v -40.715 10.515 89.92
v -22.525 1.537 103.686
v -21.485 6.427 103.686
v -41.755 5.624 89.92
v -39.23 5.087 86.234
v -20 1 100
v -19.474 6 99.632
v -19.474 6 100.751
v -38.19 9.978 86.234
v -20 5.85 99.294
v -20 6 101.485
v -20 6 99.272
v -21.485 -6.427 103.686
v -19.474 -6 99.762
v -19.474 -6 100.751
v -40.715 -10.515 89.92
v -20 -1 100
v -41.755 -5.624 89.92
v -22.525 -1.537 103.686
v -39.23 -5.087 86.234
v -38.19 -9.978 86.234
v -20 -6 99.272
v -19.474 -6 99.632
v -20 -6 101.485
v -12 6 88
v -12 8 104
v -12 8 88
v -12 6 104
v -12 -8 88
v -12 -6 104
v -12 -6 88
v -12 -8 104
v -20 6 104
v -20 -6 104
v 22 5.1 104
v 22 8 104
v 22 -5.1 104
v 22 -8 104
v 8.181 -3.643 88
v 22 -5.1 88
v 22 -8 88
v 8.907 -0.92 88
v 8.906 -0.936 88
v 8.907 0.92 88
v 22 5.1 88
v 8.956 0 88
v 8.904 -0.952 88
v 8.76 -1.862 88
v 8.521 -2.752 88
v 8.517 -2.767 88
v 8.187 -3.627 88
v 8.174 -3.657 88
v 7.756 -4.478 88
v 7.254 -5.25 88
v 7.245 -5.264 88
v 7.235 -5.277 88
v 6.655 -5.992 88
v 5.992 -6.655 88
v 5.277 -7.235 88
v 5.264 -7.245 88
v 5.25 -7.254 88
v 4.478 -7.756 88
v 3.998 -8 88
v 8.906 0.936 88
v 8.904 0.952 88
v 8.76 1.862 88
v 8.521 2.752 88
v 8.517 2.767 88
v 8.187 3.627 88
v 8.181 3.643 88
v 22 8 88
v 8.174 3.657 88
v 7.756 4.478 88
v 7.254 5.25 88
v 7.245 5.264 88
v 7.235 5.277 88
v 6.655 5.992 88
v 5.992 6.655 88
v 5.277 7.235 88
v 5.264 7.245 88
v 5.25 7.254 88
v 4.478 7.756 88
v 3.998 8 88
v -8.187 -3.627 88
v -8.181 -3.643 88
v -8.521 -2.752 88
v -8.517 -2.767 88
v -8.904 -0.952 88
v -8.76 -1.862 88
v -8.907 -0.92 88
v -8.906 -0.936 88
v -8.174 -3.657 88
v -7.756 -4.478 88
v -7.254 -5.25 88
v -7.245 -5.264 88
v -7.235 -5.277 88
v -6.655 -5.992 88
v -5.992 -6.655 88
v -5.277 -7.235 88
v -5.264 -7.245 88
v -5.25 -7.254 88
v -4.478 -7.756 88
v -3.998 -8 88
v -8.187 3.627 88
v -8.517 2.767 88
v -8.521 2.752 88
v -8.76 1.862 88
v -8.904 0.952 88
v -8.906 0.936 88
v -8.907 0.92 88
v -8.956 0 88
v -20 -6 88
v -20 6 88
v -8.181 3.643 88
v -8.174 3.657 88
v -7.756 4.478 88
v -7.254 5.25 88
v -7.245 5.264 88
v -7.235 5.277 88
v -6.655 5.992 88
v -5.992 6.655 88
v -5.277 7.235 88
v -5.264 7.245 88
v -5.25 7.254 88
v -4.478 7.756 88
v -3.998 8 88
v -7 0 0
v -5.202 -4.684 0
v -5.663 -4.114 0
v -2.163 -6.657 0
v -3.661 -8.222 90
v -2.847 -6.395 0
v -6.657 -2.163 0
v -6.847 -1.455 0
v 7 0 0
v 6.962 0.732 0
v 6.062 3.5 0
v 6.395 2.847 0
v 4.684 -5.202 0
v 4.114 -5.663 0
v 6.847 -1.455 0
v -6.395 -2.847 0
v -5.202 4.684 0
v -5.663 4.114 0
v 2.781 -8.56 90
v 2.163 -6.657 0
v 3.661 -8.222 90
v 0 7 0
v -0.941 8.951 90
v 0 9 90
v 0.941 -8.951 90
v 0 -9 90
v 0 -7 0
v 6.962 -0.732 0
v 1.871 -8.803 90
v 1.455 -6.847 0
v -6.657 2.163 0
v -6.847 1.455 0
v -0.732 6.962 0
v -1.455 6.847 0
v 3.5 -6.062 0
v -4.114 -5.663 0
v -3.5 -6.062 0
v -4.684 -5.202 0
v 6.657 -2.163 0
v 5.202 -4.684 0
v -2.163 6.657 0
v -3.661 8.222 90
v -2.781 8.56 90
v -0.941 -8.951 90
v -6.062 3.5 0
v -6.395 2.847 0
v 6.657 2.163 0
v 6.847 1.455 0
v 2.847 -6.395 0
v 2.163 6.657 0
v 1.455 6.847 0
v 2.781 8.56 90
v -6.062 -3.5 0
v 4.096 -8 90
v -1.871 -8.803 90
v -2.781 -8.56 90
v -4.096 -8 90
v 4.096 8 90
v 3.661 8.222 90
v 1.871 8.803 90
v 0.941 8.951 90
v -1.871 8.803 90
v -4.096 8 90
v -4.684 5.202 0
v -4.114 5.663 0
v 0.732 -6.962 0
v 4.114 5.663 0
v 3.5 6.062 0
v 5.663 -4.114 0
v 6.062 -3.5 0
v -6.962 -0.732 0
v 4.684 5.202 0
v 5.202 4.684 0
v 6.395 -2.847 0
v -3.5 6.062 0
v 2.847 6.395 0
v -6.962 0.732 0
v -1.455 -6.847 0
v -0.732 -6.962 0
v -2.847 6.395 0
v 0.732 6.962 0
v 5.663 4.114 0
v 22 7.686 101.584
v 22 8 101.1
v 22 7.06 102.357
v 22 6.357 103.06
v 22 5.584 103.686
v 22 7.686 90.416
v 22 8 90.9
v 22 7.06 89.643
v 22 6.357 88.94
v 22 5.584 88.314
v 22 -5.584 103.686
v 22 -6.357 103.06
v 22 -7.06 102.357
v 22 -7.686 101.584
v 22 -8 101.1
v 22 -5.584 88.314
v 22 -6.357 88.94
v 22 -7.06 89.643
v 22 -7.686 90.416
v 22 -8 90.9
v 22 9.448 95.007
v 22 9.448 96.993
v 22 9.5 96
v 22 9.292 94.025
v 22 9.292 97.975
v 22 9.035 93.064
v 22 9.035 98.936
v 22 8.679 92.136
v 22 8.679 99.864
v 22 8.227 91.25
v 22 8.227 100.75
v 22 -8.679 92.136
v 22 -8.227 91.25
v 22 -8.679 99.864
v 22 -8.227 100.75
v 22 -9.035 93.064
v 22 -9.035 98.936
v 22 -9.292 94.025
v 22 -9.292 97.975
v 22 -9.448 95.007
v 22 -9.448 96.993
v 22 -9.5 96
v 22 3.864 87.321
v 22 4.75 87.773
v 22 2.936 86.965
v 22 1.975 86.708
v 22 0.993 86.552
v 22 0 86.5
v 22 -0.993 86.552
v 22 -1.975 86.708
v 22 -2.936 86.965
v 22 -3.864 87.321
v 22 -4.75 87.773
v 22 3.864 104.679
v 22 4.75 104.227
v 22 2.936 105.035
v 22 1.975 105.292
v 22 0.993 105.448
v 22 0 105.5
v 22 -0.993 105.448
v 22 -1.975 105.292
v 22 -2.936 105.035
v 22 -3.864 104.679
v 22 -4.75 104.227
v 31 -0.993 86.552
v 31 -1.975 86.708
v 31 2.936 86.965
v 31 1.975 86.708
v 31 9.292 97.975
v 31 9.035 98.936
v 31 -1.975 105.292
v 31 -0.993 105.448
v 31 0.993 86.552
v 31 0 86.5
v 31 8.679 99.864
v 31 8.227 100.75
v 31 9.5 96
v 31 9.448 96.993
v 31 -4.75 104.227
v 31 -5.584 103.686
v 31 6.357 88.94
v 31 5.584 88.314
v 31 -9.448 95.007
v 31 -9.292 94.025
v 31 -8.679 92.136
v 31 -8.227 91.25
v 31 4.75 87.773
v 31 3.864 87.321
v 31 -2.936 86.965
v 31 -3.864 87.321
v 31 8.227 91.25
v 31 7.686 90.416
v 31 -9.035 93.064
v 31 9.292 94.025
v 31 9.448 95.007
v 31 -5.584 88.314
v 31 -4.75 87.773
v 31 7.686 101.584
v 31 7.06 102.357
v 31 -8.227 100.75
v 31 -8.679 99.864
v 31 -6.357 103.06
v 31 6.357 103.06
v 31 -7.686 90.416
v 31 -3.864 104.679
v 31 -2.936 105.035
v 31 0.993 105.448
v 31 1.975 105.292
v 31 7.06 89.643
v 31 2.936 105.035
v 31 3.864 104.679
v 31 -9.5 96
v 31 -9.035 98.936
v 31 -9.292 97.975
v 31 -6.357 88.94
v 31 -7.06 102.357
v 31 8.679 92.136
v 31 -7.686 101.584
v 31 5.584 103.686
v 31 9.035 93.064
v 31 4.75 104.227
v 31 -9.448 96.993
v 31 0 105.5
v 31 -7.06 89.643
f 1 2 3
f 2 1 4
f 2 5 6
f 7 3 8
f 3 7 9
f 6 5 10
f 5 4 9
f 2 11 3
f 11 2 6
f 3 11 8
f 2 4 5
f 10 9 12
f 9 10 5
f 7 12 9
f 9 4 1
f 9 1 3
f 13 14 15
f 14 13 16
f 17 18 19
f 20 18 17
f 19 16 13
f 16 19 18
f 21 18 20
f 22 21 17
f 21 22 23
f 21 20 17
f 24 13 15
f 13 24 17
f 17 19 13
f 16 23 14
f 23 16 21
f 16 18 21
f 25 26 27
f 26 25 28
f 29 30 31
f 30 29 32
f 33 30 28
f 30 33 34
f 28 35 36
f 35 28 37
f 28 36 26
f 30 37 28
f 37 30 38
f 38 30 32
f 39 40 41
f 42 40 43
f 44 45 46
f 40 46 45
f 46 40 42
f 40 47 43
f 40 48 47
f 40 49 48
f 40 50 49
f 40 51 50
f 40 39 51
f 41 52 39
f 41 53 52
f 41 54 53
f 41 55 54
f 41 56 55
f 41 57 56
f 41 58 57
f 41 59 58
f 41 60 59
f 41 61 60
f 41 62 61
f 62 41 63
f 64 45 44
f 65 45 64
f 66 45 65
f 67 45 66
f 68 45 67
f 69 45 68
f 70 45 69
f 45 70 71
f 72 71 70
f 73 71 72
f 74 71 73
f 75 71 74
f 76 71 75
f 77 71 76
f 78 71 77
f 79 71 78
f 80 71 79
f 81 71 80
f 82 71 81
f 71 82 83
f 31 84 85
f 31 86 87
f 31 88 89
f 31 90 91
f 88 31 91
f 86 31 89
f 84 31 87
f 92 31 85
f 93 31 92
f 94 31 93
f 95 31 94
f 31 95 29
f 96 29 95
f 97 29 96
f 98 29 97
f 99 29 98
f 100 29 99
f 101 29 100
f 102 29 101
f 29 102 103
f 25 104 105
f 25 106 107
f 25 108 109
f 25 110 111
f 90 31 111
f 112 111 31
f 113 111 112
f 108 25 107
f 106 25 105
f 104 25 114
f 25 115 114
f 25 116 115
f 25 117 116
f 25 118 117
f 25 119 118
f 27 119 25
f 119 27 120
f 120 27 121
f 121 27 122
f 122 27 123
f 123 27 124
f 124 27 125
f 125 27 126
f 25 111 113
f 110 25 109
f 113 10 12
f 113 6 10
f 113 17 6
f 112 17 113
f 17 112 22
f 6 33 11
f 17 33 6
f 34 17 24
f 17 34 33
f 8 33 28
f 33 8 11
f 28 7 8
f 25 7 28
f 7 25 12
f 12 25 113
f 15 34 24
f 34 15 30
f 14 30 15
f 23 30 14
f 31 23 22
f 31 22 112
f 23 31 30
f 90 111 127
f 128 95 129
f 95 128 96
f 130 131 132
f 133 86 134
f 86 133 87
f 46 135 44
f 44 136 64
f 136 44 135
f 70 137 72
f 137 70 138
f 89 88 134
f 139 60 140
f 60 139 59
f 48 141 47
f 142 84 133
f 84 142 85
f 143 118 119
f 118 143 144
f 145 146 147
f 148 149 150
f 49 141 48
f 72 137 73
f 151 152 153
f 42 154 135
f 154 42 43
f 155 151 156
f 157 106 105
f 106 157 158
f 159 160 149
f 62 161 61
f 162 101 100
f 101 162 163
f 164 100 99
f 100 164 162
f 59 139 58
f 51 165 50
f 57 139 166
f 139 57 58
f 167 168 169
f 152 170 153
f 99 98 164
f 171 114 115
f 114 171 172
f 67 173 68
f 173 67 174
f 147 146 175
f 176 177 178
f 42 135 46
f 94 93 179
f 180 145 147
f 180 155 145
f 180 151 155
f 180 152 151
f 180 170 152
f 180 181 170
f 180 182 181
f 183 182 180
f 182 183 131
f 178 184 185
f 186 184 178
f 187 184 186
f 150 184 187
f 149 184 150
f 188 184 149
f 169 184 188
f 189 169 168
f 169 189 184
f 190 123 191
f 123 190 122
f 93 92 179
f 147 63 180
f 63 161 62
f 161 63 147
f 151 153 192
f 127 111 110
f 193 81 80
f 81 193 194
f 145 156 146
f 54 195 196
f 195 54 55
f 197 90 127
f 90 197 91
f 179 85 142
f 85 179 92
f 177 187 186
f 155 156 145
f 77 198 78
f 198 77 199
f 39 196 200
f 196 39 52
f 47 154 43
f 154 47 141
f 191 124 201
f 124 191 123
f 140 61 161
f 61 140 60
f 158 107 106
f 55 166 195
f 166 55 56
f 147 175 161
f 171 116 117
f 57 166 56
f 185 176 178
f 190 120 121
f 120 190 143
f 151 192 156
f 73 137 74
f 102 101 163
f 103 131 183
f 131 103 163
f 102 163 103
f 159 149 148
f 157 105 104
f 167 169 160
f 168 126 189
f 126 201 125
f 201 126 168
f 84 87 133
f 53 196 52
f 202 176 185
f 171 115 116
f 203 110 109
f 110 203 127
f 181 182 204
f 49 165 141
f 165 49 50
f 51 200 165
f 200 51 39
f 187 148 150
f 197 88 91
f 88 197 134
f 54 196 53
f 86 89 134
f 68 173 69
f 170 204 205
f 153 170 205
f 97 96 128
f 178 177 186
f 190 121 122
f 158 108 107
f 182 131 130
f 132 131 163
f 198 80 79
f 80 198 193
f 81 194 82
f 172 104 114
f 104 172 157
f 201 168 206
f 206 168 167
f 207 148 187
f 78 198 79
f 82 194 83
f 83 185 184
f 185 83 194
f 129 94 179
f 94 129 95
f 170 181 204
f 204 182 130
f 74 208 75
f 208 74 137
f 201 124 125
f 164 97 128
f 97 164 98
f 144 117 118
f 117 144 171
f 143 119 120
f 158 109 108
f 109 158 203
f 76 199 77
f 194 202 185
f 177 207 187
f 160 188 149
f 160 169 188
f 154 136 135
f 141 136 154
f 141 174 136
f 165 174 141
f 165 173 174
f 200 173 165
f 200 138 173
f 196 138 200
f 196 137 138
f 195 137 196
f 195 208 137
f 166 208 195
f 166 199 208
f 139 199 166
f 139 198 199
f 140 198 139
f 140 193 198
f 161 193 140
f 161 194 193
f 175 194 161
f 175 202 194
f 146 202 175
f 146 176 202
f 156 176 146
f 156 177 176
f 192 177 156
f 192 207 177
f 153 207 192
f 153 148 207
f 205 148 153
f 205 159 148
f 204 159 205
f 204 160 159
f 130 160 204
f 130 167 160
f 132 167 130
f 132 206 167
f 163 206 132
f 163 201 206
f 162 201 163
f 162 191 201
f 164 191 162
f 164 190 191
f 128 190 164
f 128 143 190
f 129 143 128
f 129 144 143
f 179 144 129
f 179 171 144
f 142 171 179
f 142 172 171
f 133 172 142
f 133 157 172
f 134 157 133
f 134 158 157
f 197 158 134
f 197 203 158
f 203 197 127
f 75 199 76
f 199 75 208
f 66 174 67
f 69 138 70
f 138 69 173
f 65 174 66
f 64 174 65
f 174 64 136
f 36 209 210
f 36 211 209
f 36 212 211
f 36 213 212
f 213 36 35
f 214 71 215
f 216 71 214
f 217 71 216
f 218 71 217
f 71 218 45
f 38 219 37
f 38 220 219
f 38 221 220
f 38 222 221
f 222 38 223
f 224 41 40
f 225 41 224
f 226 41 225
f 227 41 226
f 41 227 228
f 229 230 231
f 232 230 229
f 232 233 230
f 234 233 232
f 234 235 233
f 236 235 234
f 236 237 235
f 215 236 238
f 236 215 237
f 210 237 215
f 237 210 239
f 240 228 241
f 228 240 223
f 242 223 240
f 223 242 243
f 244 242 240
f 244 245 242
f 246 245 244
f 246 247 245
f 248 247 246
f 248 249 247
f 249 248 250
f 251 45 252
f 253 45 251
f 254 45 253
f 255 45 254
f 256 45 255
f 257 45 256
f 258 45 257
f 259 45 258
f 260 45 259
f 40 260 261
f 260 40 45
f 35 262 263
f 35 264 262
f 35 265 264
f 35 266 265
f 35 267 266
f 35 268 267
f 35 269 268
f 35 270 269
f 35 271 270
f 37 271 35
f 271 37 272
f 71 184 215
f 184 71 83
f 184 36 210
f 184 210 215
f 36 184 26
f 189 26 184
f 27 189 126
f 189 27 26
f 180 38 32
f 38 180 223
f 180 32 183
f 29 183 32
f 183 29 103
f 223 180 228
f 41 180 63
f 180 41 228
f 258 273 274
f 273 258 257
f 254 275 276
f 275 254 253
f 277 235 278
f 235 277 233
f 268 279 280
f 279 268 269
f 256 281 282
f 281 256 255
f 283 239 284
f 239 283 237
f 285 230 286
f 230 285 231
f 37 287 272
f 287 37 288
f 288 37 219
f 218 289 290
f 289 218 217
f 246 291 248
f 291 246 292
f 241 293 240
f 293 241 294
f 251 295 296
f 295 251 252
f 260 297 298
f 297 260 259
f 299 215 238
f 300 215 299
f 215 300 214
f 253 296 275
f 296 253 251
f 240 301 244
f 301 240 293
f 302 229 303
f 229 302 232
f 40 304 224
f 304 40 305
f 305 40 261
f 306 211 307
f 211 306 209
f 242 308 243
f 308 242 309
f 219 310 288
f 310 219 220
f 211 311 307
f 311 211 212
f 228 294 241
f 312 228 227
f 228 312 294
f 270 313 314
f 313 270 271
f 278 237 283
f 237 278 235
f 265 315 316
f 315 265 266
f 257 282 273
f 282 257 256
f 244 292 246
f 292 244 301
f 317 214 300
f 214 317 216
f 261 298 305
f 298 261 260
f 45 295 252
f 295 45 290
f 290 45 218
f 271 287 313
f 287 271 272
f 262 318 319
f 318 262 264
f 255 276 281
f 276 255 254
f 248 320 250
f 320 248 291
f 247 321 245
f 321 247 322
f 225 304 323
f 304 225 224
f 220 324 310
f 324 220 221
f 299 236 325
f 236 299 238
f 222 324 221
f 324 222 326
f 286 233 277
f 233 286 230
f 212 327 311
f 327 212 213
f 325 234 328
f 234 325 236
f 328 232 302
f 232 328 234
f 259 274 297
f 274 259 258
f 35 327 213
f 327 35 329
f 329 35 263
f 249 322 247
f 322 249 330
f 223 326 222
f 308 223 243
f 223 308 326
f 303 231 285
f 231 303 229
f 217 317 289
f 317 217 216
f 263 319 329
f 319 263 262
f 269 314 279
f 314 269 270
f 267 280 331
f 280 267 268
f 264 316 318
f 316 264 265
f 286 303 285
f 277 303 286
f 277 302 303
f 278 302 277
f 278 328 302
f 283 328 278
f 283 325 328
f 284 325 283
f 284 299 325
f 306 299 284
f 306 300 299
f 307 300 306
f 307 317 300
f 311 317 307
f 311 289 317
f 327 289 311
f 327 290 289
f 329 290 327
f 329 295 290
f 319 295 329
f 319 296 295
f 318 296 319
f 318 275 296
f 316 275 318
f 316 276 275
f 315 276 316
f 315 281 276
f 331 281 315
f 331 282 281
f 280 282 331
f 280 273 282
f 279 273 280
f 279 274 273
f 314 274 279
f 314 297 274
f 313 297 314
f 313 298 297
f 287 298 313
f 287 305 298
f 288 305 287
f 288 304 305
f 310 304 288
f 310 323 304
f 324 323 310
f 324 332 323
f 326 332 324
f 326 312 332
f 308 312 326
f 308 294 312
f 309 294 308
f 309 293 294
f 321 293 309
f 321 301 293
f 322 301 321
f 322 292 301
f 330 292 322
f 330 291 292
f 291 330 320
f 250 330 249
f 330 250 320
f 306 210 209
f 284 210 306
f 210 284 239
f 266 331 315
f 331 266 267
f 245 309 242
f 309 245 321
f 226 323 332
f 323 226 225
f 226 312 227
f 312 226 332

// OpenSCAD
// file: _common.scad
// mechanism 共用設定 + 齒輪 module
$fn = 60;

// 簡化齒輪：N 個齒、節圓半徑 r、齒高 h、齒寬 w
module simple_gear(N = 16, r = 20, h = 4, thick = 6) {
  union() {
    // 主圓盤
    cylinder(h = thick, r = r, center = true);
    // 齒（梯形）
    for (i = [0:N-1]) {
      rotate([0, 0, i * 360 / N])
        translate([r, 0, 0])
          linear_extrude(height = thick, center = true)
            polygon([[0, -2.4], [h, -1.4], [h, 1.4], [0, 2.4]]);
    }
    // 中心凸軸
    cylinder(h = thick * 1.4, r = r * 0.18, center = true);
  }
}
// main file
// 羊角錘 Claw Hammer — 木柄 + 鋼錘頭 + 爪部
include <_common.scad>

// 木柄（圓柱）
color([0.55, 0.27, 0.13])
  cylinder(h = 90, r1 = 7, r2 = 9, center = false);

// 錘頭主體（鋼）
color([0.45, 0.45, 0.45])
  translate([-12, -8, 88]) cube([34, 16, 16]);

// 打擊面：2026-10 修正：羊角錘的鎚面是圓形（原本是方塊）
color([0.30, 0.30, 0.30])
  translate([22, 0, 96]) rotate([0, 90, 0]) cylinder(h = 9, r = 9.5);

// 羊角爪（後方分叉）
color([0.45, 0.45, 0.45])
  translate([-20, -6, 88]) {
    // V 形爪（兩根薄塊從爪根上緣向後（-X）伸出、向下彎 35°，並左右各張開 12° → 中間是 V 形缺口）
    // 2026-10 本機算繪後再修：原本兩爪平行、長 16、間隙只有 2，等角圖上看不出 V 形
    translate([0, 7, 12]) rotate([0, 0, -12]) mirror([1, 0, 0]) rotate([0, 35, 0]) cube([24, 5, 4.5]);
    translate([0, 5, 12]) rotate([0, 0, 12]) mirror([1, 0, 0]) rotate([0, 35, 0]) translate([0, -5, 0]) cube([24, 5, 4.5]);
    // 爪根
    cube([8, 12, 16]);
  }
